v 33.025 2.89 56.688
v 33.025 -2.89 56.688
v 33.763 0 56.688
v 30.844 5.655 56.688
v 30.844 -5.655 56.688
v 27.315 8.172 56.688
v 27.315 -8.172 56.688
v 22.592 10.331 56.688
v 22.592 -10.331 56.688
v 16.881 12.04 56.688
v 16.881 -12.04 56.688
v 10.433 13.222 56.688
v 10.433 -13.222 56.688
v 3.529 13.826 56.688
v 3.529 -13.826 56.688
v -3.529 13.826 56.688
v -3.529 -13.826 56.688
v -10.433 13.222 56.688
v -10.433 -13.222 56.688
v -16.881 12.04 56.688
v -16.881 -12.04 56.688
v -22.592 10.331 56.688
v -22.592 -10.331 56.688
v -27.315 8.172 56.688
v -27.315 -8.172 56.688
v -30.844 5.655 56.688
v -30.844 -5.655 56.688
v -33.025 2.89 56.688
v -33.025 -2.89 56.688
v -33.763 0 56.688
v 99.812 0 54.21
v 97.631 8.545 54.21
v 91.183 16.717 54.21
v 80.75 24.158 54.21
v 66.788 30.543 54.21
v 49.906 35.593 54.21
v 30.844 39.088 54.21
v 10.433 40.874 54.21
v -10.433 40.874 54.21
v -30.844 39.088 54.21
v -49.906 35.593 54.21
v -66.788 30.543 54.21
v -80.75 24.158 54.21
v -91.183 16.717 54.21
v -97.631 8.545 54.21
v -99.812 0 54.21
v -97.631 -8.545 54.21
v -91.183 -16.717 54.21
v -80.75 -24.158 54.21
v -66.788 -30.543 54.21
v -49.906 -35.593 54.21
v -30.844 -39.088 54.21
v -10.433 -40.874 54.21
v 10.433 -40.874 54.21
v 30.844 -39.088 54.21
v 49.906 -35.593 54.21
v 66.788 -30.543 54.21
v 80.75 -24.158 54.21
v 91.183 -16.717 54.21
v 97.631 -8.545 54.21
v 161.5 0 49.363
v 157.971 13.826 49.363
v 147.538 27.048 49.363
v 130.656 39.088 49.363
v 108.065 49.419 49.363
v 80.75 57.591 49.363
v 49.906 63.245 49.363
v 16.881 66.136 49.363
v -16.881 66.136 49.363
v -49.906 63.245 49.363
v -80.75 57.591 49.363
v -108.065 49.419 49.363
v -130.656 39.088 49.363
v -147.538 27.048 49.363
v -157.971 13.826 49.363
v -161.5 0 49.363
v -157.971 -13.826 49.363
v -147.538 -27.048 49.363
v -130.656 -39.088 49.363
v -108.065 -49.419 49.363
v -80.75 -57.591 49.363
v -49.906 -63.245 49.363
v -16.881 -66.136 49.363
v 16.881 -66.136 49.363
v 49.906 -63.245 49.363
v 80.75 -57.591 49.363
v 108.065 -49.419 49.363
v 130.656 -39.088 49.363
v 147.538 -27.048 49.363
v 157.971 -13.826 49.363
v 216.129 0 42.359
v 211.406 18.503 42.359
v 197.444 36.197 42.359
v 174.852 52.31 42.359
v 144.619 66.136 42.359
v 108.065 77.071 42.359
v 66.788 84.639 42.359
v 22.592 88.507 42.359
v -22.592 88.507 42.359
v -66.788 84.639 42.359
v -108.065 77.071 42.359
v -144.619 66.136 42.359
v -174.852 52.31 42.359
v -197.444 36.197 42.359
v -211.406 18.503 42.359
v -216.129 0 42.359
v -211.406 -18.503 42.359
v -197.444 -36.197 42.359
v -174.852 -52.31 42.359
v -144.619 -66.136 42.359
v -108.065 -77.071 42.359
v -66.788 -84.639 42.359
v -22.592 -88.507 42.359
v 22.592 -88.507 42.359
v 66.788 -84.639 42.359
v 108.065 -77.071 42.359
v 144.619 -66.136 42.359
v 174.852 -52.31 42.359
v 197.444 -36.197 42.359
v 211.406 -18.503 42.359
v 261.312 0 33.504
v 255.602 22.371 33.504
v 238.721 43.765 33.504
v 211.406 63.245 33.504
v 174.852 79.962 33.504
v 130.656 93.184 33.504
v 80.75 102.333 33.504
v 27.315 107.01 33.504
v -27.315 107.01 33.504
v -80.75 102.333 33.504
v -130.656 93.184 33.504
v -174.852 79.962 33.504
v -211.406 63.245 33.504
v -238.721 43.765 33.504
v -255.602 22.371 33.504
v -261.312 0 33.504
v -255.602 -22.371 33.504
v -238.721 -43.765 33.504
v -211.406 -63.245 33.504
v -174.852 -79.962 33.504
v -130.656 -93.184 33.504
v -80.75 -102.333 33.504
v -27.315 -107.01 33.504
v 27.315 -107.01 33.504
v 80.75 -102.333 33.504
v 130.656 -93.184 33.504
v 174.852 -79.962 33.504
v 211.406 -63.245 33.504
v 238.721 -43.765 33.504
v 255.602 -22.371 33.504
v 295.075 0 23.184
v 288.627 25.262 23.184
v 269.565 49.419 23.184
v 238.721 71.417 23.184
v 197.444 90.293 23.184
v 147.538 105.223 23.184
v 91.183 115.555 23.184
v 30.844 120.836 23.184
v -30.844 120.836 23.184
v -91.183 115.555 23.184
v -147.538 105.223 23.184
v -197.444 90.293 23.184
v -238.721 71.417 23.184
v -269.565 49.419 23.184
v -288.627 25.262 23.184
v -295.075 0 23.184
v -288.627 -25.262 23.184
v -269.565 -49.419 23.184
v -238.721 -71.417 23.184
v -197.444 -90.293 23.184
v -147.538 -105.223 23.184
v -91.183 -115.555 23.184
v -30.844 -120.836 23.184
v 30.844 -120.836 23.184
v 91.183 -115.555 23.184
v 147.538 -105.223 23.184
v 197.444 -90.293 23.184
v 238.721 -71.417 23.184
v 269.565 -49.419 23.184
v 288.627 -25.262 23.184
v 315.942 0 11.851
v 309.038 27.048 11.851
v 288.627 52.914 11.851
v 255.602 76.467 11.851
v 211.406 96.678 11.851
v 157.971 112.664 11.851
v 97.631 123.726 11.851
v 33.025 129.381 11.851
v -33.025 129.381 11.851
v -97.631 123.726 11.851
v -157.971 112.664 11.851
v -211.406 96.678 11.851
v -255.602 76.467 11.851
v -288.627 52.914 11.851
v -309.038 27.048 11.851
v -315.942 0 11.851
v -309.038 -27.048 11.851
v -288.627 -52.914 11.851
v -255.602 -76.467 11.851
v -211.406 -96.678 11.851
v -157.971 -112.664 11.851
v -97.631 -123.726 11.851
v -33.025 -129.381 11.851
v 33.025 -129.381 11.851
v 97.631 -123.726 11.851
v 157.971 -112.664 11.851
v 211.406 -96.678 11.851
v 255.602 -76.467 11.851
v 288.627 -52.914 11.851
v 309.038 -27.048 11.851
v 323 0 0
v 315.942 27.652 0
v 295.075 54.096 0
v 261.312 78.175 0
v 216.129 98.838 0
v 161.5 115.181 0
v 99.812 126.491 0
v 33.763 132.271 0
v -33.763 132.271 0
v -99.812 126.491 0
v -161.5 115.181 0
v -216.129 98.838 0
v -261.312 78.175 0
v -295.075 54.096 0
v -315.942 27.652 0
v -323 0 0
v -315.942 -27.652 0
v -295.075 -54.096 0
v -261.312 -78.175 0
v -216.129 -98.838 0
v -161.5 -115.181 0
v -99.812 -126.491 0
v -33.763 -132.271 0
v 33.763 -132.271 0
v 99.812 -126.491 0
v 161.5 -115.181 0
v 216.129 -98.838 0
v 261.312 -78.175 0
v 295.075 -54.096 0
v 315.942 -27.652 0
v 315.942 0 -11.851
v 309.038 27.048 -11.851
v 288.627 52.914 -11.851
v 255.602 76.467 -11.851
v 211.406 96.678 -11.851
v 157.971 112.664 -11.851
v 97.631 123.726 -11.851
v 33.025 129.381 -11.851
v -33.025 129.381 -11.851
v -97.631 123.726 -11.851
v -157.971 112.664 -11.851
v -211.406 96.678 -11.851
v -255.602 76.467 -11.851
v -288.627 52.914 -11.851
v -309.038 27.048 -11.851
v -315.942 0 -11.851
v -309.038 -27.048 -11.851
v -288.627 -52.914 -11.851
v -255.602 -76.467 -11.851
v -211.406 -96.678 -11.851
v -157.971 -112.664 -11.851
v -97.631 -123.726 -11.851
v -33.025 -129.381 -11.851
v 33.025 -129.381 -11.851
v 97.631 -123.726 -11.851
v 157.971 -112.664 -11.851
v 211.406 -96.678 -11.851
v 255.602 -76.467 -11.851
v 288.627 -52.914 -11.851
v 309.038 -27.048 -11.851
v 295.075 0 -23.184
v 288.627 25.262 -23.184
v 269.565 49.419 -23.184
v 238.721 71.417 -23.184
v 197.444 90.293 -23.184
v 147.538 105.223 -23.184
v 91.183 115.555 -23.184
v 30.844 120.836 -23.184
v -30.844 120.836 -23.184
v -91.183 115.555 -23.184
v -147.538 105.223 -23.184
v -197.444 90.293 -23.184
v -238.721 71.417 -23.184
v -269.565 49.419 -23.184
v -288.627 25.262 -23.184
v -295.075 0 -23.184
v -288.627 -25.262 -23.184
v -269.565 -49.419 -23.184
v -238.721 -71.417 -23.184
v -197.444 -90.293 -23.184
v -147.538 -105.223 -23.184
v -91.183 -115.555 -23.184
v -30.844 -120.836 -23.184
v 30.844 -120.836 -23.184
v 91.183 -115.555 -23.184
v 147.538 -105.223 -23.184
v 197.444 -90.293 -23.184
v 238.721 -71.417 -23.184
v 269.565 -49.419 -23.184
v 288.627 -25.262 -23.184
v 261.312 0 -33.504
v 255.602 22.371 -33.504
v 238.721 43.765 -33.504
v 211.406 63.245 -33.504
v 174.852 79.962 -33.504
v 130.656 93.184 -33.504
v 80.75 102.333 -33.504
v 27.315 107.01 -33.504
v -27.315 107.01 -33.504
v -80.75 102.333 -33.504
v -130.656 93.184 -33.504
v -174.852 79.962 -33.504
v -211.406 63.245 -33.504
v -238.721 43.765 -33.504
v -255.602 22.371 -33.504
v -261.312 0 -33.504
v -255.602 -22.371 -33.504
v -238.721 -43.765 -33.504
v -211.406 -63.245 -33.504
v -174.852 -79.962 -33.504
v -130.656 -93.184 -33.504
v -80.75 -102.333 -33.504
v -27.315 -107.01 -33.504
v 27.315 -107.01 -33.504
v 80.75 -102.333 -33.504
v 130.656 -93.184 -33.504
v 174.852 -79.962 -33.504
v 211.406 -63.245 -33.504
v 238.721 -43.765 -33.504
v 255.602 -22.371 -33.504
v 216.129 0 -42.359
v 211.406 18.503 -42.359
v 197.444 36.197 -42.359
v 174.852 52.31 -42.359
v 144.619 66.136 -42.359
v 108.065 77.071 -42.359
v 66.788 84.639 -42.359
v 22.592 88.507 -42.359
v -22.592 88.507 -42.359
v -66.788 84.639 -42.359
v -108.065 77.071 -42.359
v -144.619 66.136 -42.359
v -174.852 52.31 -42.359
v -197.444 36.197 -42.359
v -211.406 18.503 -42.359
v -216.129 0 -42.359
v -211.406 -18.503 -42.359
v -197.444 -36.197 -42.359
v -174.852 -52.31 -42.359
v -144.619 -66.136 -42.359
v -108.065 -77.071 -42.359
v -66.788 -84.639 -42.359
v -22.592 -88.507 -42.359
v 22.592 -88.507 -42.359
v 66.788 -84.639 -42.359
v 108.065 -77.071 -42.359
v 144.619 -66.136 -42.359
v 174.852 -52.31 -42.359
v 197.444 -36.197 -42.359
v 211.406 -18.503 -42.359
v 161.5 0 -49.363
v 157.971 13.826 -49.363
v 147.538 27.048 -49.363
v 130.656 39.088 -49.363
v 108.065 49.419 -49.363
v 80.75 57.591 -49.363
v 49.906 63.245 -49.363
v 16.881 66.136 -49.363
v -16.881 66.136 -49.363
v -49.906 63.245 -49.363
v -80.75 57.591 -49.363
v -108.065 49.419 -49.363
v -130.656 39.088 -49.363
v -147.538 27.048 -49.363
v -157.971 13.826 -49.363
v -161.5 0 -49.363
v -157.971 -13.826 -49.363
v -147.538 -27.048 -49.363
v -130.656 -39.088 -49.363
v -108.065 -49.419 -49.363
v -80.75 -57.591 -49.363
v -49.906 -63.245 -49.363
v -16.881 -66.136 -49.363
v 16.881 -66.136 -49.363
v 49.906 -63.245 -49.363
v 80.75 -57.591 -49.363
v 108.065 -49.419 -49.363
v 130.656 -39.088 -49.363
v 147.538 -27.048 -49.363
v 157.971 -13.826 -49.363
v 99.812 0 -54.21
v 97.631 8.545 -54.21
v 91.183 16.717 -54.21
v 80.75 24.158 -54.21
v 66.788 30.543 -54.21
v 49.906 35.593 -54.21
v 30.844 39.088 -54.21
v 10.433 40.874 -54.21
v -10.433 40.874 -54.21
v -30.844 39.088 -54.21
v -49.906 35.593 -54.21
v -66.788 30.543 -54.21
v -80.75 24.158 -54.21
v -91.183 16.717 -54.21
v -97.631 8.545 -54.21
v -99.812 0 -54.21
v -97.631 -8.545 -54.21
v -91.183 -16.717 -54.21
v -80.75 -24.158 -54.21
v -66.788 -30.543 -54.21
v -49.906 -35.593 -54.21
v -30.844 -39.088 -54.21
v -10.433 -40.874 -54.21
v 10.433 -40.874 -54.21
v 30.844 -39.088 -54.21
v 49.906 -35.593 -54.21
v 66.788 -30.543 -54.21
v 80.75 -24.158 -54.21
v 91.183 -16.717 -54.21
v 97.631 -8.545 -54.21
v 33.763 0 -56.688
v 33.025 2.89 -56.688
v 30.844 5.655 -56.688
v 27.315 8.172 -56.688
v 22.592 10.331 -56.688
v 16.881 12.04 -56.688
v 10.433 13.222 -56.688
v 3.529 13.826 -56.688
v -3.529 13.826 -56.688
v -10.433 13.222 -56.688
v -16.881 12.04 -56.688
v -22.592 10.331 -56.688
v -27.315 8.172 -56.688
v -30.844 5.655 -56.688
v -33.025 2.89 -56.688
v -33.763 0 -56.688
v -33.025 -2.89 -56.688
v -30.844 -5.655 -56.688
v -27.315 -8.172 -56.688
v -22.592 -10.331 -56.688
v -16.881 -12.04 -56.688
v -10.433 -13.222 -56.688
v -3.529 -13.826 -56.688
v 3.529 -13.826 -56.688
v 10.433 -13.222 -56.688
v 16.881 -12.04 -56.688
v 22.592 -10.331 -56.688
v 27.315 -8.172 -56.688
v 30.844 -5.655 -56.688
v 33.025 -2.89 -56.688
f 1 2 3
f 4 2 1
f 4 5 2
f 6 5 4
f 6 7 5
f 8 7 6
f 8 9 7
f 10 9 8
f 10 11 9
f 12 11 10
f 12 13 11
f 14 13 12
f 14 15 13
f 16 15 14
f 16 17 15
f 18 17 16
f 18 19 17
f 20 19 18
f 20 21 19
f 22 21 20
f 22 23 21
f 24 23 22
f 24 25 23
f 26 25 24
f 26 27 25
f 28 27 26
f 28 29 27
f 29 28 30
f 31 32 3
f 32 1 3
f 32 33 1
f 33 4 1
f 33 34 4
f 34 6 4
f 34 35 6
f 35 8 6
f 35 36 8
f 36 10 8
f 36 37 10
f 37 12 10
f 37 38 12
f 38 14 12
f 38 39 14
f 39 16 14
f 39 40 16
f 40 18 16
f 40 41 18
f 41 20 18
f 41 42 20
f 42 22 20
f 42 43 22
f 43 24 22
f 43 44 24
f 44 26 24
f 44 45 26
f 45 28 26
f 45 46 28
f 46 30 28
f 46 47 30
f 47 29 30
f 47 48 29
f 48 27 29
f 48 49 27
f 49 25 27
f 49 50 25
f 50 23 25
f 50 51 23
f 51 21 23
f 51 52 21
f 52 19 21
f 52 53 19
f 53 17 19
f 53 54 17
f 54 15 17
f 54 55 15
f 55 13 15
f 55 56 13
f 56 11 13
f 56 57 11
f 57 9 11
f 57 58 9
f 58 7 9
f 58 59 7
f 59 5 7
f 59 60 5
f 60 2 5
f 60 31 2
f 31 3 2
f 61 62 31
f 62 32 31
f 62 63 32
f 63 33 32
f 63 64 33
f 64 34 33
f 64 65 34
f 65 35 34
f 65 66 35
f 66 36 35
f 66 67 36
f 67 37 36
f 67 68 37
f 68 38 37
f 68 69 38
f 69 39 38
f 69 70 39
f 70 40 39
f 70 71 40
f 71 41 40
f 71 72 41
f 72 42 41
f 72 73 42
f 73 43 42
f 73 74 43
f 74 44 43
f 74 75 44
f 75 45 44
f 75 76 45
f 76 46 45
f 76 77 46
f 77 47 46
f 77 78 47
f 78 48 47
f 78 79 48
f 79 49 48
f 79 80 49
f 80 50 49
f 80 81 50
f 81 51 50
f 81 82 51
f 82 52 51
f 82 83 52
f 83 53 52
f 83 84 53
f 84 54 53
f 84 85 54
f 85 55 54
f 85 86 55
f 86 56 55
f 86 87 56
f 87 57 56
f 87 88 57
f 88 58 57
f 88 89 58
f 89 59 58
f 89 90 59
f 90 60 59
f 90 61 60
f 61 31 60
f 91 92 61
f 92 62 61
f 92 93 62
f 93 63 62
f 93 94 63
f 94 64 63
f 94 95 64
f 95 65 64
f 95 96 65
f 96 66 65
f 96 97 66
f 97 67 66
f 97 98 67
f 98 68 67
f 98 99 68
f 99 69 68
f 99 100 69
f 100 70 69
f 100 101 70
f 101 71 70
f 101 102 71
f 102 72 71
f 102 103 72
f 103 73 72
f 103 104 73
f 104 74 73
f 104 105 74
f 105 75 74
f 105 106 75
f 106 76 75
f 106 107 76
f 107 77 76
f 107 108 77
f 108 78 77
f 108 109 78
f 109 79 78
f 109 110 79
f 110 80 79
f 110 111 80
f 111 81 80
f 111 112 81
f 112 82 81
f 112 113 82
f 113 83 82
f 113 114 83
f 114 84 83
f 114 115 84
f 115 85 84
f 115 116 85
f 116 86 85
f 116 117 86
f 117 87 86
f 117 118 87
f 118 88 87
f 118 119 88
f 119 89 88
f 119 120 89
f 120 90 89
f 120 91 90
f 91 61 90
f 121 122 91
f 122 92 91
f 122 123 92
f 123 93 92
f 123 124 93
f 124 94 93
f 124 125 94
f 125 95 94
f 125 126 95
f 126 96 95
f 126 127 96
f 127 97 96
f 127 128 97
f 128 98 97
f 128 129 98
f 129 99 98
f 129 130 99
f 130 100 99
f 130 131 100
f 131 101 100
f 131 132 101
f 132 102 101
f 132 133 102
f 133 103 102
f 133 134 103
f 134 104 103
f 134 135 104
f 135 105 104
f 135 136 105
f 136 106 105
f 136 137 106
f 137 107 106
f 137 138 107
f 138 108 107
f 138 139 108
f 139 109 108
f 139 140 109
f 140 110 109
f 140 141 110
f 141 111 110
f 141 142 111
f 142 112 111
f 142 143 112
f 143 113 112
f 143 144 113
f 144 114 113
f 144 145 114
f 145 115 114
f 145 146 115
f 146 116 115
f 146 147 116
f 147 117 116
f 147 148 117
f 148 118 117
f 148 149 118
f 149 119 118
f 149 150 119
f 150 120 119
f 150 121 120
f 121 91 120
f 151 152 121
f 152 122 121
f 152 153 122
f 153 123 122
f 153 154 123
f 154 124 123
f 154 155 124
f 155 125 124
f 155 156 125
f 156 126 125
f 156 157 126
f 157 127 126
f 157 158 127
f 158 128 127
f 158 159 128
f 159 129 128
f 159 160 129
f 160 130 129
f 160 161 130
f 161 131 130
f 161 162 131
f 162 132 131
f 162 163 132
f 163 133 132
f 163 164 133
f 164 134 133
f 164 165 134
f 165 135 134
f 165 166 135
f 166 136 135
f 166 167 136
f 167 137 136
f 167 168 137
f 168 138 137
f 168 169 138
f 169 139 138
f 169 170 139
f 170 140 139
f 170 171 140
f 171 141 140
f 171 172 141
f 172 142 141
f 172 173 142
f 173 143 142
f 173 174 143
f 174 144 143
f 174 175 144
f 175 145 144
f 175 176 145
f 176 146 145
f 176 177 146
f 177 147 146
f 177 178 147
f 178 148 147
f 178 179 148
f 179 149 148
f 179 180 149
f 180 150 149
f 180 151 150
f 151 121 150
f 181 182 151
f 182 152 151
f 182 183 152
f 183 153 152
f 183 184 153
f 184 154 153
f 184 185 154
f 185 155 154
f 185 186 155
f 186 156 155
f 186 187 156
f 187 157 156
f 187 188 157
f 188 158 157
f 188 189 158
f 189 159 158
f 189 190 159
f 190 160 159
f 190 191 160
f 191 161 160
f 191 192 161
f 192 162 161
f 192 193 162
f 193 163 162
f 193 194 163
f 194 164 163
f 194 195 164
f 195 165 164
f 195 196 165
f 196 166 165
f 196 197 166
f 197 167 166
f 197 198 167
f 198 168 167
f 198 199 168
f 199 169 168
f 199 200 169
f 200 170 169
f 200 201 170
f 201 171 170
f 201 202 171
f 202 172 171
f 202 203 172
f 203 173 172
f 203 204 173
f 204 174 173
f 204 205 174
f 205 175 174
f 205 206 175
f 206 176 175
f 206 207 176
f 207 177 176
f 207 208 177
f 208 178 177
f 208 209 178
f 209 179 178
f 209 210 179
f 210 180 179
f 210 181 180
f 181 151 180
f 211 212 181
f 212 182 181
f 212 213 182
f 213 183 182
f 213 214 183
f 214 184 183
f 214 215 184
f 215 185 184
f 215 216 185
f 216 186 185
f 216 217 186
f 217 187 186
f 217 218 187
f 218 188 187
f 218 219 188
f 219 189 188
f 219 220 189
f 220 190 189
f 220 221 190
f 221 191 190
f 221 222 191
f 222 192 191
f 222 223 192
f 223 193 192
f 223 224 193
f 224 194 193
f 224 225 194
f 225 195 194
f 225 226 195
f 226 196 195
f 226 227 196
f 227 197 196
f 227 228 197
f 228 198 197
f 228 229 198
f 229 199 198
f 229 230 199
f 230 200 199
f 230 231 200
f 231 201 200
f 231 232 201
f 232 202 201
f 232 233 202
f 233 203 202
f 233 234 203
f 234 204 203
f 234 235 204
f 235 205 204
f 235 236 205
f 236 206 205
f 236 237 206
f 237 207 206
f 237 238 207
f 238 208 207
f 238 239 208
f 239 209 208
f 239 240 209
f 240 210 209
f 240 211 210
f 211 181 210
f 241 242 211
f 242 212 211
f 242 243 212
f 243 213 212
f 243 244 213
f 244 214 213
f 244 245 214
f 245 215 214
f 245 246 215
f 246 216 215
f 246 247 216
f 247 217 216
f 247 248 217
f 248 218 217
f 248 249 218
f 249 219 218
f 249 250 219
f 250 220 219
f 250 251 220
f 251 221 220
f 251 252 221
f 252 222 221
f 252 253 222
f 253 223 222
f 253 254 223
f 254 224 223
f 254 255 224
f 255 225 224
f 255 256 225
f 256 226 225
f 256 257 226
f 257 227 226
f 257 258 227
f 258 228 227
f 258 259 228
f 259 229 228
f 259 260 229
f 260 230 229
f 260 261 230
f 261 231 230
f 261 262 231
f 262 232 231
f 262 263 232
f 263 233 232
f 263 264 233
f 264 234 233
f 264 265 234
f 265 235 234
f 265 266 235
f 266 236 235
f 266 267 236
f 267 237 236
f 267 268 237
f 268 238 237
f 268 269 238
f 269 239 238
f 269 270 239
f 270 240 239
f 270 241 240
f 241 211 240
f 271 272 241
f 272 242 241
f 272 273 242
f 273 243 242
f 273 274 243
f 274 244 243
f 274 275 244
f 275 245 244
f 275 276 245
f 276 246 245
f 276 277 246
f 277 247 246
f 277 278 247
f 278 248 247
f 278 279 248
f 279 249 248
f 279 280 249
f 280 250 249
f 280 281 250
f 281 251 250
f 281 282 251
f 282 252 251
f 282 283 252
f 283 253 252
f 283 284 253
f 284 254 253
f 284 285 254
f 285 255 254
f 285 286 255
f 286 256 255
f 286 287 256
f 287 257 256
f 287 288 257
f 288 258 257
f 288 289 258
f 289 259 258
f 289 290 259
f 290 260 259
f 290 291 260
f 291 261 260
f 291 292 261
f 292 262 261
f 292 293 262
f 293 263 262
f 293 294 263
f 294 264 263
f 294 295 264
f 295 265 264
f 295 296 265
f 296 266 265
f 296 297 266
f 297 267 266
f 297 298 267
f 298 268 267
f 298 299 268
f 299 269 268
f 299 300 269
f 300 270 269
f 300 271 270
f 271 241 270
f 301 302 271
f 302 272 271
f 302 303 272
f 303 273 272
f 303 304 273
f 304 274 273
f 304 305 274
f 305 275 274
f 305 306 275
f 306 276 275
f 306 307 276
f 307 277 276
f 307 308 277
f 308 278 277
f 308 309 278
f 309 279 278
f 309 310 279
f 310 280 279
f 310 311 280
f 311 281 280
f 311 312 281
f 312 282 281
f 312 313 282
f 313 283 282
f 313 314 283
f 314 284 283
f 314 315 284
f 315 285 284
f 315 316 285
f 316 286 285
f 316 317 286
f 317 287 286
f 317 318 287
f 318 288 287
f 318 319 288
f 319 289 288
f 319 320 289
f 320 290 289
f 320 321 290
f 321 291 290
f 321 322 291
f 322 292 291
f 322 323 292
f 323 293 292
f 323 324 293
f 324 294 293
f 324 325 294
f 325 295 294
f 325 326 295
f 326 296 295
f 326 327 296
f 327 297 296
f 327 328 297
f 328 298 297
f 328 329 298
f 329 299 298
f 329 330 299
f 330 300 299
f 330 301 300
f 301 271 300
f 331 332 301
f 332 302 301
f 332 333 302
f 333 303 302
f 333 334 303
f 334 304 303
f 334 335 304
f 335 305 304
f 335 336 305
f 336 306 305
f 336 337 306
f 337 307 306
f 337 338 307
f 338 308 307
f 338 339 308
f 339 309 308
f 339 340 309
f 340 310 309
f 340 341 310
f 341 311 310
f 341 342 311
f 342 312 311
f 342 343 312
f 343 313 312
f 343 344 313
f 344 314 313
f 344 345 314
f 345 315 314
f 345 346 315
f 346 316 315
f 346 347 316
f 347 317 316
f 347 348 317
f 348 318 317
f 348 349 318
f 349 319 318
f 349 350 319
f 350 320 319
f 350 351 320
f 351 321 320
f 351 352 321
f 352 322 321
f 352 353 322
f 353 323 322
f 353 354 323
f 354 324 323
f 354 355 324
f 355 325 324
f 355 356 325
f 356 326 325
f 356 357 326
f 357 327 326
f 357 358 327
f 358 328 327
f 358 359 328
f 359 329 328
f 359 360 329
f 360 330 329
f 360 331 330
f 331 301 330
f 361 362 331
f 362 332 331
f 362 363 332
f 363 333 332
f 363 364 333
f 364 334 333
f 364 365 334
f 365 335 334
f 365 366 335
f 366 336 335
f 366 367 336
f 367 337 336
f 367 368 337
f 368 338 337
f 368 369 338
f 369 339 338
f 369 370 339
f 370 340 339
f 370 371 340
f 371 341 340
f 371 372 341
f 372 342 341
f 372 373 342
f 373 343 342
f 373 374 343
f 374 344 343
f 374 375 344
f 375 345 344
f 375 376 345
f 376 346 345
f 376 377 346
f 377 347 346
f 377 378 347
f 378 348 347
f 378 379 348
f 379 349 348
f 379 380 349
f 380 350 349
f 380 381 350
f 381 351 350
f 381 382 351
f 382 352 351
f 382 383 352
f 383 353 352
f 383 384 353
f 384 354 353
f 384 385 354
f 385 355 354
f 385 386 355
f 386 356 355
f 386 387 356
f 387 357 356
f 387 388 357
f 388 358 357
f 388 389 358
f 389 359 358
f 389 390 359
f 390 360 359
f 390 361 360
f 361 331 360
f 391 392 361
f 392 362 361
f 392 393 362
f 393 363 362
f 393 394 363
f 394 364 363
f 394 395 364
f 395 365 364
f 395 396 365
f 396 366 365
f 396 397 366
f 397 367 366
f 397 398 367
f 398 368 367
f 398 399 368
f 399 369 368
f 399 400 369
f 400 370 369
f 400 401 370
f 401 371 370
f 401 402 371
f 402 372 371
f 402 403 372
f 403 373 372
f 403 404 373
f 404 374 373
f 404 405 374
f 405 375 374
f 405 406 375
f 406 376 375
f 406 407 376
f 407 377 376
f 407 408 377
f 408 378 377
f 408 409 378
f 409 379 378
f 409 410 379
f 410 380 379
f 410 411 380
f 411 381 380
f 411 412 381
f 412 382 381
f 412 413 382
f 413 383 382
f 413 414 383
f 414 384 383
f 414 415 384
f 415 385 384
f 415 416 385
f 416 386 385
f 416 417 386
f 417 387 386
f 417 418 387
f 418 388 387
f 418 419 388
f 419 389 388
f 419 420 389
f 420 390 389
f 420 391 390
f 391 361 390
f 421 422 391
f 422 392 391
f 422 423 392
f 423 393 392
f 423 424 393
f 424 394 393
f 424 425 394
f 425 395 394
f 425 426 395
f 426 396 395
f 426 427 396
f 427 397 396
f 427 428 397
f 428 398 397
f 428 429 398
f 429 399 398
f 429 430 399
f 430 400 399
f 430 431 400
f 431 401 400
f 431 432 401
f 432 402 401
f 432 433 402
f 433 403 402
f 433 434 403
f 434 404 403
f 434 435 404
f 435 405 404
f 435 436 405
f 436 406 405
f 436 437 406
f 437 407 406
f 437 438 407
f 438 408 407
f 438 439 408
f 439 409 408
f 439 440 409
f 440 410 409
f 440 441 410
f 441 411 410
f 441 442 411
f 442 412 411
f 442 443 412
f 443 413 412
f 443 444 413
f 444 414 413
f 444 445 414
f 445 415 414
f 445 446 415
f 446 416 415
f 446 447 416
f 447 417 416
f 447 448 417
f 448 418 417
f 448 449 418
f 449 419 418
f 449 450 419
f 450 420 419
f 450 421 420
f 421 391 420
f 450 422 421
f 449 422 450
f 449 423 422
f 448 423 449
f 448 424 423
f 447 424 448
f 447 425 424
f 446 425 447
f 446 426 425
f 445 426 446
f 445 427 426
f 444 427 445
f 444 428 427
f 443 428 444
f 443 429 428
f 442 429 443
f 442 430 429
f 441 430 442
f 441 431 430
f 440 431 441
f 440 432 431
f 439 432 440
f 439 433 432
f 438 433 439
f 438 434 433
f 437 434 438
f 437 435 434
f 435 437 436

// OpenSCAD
// Generated by SolidPython 1.0.1 on 2020-07-29 00:46:52


scale(v = [17, 7, 3]) {
	sphere(r = 19);
}
/***********************************************
*********      SolidPython code:      **********
************************************************
 
# import packages: SolidPython
from solid import *
from solid.utils import *
from itertools import chain, combinations, permutations


class Resize:

    def __init__(self, scad_file):
        self.scad_file = scad_file
        #self.scad_file = import_scad(scad_file)
        # cone/cylinder param:
        self.r1 = 0
        self.r2 = 0
        self.h = 0
        # rectangular prism param:
        self.w = 0
        self.l = 0
        # ellipse param:
        self.r = 0

    # import OpenScad code (file name corresponds to shape)


    # classify shape + parameters
    def assign(self, param1, param2, param3):
        if self.scad_file == 'cone.scad':
            self.r1 = param1
            self.r2 = param2
            self.h = param3
        elif self.scad_file == 'cylinder.scad':
            self.r1 = param1
            self.r2 = param2
            self.h = param3
        elif self.scad_file == 'rectangularPrism.scad':
            self.h = param1
            self.l = param2
            self.w = param3
        else:
            self.r = param1
            self.h = param2

    # resize parameters
    def iterate(self):
        x = range(3, 20, 2)
        i = 1
        if self.scad_file == 'cone.scad':
            tempList = list(permutations(x, 2))
            for temp in tempList:
                param1 = temp[0]
                param2 = temp[1]
                filepath = 'produced_scad_files/' + 'cone' + str(param1) + '_' + str(param2) + '_' + '.scad'
                scad_render_to_file(cylinder(h=param1, r1=param2, r2=0), filepath)

        elif self.scad_file == 'cylinder.scad':
            tempList = list(permutations(x, 3))
            for temp in tempList:
                param1 = temp[0]
                param2 = temp[1]
                filepath = 'produced_scad_files/' + 'cylinder' + str(param1) + '_' + str(param2) + '_' + '.scad'
                scad_render_to_file(cylinder(h=param1, r1=param2, r2=param2), filepath)

        elif self.scad_file == 'rectangularPrism.scad':
            tempList = list(permutations(x, 3))
            for temp in tempList:
                param1 = temp[0]
                param2 = temp[1]
                param3 = temp[2]
                filepath = 'produced_scad_files/' + 'rectangularPrism' + str(param1) + '_' + str(param2) + '_' + str(
                    param3) + '.scad'
                scad_render_to_file(cube(size=(param1, param2, param3)), filepath)

        elif self.scad_file == 'ellipse.scad':
            tempList = list(permutations(x, 4))
            for temp in tempList:
                param1 = temp[0]
                param2 = temp[1]
                param3 = temp[2]
                param4 = temp[3]
                filepath = 'produced_scad_files/' + 'ellipse' + str(param1) + '_' + str(param2) + '_' + str(param3) + '_' + str(param4) + '.scad'
                scad_render_to_file(scale([param1, param2, param3])(sphere(r=param4)), filepath)

    def render_to_scadfile(self):
        scad_render_to_file(scad, 'example.scad') 
 
************************************************/
